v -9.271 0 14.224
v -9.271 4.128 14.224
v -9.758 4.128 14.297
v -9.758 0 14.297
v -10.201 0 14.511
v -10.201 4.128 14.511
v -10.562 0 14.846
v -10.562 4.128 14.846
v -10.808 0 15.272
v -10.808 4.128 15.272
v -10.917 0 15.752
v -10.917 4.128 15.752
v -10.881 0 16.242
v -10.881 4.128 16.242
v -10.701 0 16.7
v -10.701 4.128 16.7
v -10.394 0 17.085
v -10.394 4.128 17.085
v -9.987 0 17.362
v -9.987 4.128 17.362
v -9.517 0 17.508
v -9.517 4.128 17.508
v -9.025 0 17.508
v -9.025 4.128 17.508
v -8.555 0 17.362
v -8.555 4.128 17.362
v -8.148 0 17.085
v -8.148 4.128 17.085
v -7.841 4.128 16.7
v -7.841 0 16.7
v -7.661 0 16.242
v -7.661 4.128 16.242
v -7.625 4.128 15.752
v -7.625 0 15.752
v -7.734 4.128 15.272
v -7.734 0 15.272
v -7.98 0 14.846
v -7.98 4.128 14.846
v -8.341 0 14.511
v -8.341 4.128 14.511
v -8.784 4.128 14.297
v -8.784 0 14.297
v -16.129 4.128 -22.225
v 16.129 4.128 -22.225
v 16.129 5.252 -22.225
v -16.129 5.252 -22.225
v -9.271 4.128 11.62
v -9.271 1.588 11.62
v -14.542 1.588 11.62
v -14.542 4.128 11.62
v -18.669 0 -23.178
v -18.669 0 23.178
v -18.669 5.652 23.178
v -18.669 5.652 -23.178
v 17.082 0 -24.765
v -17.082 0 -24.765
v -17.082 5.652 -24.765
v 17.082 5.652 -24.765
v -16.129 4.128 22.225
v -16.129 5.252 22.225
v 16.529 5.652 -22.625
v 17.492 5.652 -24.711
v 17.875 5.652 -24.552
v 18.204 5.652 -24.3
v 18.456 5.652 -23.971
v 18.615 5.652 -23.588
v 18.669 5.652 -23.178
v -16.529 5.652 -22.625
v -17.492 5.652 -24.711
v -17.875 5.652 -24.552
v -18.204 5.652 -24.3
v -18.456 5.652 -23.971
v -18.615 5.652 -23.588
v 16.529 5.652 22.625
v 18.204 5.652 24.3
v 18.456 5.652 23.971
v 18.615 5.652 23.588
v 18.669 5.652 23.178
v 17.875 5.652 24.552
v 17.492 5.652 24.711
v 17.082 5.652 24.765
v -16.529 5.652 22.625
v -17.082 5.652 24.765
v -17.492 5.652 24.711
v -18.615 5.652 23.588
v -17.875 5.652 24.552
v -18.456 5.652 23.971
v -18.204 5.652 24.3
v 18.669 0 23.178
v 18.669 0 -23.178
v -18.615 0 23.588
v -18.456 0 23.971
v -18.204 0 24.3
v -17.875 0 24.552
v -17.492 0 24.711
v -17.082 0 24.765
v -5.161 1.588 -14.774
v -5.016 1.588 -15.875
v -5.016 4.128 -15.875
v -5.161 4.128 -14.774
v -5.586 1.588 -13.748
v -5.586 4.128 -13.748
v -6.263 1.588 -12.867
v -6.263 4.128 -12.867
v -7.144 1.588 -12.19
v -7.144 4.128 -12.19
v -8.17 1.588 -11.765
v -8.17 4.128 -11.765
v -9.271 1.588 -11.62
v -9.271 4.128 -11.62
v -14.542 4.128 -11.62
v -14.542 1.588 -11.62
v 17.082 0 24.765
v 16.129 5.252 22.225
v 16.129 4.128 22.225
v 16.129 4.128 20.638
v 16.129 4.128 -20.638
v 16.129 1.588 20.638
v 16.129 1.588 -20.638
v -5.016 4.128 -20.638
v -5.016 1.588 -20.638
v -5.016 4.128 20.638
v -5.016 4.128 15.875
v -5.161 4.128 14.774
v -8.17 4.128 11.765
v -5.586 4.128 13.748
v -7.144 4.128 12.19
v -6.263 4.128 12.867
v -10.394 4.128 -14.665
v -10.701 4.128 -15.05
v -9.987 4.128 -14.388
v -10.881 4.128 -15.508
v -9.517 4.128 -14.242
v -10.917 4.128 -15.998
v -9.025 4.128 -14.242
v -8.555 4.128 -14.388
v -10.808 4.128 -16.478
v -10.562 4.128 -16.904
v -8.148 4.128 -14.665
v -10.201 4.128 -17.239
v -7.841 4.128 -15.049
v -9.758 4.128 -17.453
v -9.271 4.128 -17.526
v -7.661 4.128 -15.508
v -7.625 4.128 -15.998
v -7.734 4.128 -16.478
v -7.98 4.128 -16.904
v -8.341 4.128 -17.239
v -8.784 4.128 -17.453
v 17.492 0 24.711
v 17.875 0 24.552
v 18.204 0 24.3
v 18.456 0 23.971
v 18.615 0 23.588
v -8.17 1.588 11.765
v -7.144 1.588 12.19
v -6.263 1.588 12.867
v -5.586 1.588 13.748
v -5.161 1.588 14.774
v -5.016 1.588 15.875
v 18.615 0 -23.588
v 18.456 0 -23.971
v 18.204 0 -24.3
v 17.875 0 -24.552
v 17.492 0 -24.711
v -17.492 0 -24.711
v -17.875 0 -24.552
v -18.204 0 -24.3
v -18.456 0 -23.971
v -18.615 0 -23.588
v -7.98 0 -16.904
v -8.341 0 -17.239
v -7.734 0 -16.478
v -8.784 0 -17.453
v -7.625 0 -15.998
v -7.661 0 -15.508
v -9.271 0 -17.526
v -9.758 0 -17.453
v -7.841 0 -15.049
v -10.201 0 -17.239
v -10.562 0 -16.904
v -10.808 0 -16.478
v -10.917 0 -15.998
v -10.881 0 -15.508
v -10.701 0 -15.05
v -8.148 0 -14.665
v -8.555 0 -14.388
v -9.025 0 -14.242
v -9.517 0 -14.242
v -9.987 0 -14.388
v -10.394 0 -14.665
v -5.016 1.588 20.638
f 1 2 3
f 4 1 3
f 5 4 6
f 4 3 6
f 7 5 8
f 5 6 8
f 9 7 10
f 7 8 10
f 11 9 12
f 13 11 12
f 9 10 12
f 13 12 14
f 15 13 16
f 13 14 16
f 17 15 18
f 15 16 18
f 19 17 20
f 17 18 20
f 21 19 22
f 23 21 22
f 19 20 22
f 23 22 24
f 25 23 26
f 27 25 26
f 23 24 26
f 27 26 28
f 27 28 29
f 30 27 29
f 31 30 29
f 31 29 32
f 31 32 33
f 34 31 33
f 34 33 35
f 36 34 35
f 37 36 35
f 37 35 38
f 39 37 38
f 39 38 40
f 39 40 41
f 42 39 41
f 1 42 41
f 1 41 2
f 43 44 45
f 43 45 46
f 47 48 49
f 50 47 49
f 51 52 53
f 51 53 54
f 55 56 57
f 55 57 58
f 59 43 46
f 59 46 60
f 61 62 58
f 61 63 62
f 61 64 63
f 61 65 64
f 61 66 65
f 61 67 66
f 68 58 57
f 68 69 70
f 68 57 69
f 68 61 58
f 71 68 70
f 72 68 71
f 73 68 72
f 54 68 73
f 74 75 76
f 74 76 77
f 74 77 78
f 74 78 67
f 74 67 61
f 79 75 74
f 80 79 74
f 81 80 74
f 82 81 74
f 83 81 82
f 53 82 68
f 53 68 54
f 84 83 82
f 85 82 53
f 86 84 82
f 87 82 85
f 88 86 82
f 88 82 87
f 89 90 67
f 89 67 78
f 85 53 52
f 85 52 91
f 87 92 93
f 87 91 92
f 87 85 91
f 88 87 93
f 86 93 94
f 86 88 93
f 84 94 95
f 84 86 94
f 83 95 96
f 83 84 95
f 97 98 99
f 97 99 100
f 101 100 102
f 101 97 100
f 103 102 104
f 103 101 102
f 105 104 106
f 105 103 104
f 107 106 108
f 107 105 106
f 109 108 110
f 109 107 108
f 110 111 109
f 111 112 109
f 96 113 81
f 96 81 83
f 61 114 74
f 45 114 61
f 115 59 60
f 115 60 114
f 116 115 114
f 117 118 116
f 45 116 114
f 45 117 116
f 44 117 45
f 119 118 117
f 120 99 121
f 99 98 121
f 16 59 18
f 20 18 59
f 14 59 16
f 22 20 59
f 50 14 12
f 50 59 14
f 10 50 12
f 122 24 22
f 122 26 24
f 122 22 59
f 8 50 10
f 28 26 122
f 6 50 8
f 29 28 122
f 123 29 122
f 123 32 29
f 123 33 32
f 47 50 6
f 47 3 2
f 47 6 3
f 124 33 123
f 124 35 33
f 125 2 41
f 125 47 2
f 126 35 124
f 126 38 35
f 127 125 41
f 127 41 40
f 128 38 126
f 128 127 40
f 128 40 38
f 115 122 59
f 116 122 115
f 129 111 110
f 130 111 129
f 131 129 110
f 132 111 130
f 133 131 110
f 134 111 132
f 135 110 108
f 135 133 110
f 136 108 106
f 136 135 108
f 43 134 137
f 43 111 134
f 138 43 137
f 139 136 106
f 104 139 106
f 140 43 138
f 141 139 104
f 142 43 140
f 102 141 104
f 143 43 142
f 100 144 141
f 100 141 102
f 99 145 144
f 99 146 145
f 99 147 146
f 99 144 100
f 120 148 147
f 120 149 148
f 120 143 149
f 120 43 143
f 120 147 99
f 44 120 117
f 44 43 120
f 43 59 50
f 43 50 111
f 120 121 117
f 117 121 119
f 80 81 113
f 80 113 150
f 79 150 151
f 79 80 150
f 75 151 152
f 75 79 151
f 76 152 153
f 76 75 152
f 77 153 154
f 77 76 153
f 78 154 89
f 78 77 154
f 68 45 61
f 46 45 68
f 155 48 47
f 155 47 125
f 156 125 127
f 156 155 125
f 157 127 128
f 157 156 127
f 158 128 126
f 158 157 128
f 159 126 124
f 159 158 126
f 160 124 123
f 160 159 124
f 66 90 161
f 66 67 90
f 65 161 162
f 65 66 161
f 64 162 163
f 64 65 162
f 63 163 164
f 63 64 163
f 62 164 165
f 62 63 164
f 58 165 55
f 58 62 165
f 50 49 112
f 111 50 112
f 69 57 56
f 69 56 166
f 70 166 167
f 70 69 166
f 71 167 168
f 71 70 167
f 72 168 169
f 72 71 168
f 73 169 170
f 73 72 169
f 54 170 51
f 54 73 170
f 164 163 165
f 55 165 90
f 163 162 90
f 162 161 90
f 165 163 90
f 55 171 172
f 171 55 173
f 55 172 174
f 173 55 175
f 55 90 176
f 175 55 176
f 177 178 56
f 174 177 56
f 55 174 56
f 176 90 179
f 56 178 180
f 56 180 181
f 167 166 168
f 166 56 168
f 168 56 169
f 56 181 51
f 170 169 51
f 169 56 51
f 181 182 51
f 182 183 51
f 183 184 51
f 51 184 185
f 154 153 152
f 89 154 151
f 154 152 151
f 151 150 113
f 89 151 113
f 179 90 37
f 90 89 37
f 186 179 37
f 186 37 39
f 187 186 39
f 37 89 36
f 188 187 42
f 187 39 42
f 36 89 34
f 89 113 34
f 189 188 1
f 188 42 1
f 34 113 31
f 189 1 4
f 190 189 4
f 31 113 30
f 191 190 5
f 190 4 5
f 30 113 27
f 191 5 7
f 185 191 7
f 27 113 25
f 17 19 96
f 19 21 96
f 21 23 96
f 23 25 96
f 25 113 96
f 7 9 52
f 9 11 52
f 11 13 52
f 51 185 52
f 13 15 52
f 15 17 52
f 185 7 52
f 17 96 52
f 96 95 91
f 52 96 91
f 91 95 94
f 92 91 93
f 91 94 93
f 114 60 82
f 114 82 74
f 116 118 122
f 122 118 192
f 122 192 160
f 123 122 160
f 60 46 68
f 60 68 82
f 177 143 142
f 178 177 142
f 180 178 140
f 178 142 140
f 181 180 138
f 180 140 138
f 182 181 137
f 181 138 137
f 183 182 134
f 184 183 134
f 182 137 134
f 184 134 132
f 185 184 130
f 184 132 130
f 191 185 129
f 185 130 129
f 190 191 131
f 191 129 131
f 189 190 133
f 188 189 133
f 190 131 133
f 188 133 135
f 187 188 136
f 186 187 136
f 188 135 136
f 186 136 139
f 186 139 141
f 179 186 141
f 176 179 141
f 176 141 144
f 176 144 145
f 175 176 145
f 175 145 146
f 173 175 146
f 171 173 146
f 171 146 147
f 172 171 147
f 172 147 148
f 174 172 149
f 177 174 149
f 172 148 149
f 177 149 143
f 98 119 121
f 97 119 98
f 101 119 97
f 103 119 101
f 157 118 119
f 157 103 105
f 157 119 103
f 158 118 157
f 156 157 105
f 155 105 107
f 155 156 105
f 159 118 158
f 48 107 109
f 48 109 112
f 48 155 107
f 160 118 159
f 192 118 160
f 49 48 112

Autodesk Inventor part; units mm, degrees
ref_plane "YZ Plane" through (0, 0, 0) normal (1, 0, 0) x (0, 1, 0)
ref_plane "XZ Plane" through (0, 0, 0) normal (0, 1, 0) x (-1, 0, 0)
ref_plane "XY Plane" through (0, 0, 0) normal (0, 0, 1) x (1, 0, 0)
sketch "Sketch2" plane through (0, 0, 0) normal (0, 1, 0) x (-1, 0, 0)
  line L0 (16.129, 22.225) -> (-16.129, 22.225)
  line L1 (-16.129, 22.225) -> (-16.129, -22.225)
  line L2 (-16.129, -22.225) -> (16.129, -22.225)
  line L3 (16.129, -22.225) -> (16.129, 22.225)
  line L4 (16.129, 22.225) -> (-16.129, -22.225) construction
  line L5 (-16.129, 22.225) -> (16.129, -22.225) construction
  line L6 (-18.669, 24.765) -> (18.669, 24.765)
  line L7 (18.669, 24.765) -> (18.669, -24.765)
  line L8 (18.669, -24.765) -> (-18.669, -24.765)
  line L9 (-18.669, -24.765) -> (-18.669, 24.765)
  circle A0 centre (9.271, 15.875) radius 2.0574 construction
  circle A1 centre (9.271, -15.875) radius 2.0574 construction
  point P0 (0, 0)
  dimension "d0" = 32.258
  dimension "d1" = 44.45
  dimension "d2" = 2.54
  dimension "d32" = 25.4
  dimension "d33" = 25.4
  dimension "d34" = 6.35
  dimension "d35" = 38.1
  dimension "d43" = 4.1148
  dimension "d44" = 4.1148
extrude "Extrusion1" add sketch "Sketch2" along normal blind 1.5875 contours L3 L2 L1 L0
extrude "Extrusion2" add sketch "Sketch2" along normal blind 5.6515
sketch "Sketch5" plane through (0, 1.5875, 0) normal (0, 1, 0) x (1, 0, 0)
  point P0 (0, 0)
sketch "Sketch6" plane through (0, 1.5875, 0) normal (0, 1, 0) x (1, 0, 0)
  line L0 (16.129, -22.225) -> (16.129, 22.225) projected
  line L1 (16.129, -20.6375) -> (-14.5415, -20.6375)
  line L2 (-14.5415, -20.6375) -> (-14.5415, 20.6375)
  line L3 (-14.5415, 20.6375) -> (16.129, 20.6375)
  line L4 (-16.129, -22.225) -> (16.129, -22.225) projected
  line L5 (-16.129, 22.225) -> (-16.129, -22.225) projected
  line L6 (16.129, 22.225) -> (-16.129, 22.225) projected
  line L7 (16.129, -22.225) -> (16.129, 22.225) projected
  line L8 (16.129, 22.225) -> (-16.129, 22.225) projected
  line L9 (-16.129, 22.225) -> (-16.129, -22.225) projected
  line L10 (-16.129, -22.225) -> (16.129, -22.225) projected
  line L11 (-5.0165, -20.6375) -> (-5.0165, -15.875)
  line L12 (-9.271, -11.6205) -> (-14.5415, -11.6205)
  line L13 (-14.5415, 11.6205) -> (-9.271, 11.6205)
  line L14 (-5.0165, 15.875) -> (-5.0165, 20.6375)
  arc A0 (-5.0165, -15.875) -> (-9.271, -11.6205) centre (-9.271, -15.875) ccw
  arc A1 (-9.271, 11.6205) -> (-5.0165, 15.875) centre (-9.271, 15.875) ccw
  circle A2 centre (-9.271, -15.875) radius 2.0574 construction
  circle A3 centre (-9.271, 15.875) radius 2.0574 construction
  point P0 (0, 0)
  dimension "d23" = 1.5875
  dimension "d24" = 1.5875
  dimension "d25" = 1.5875
  dimension "d29" = 9.525
  dimension "d31" = 9.525
extrude "Extrusion4" add sketch "Sketch6" along normal blind 2.54 contours L4 L5 L6 L0 L3 L2 L1 | L1 L2 L12 A0 L11 | L14 A1 L13 L2 L3
hole "Hole2" at (-9.271, 0, 15.875) at (-9.271, 0, -15.875) direction (0, 1, 0) diameter 3.302 end through all thread size "8-32 UNC" class "2B" standard "ANSI Unified Screw Threads"
chamfer "Chamfer1" distance 0.4 angle 45 4 edges at (-16.129, 5.6515, 0) (0, 5.6515, 22.225) (16.129, 5.6515, 0) (0, 5.6515, -22.225)
fillet "Fillet1" radius 1.5875 4 edges at (18.669, 2.8258, -24.765) (18.669, 2.8258, 24.765) (-18.669, 2.8258, 24.765) (-18.669, 2.8258, -24.765)
equation "\"d33\" = d32"
equation "\"d31\" = d29"
properties part number "TOF mount" material "ABS Plastic"
